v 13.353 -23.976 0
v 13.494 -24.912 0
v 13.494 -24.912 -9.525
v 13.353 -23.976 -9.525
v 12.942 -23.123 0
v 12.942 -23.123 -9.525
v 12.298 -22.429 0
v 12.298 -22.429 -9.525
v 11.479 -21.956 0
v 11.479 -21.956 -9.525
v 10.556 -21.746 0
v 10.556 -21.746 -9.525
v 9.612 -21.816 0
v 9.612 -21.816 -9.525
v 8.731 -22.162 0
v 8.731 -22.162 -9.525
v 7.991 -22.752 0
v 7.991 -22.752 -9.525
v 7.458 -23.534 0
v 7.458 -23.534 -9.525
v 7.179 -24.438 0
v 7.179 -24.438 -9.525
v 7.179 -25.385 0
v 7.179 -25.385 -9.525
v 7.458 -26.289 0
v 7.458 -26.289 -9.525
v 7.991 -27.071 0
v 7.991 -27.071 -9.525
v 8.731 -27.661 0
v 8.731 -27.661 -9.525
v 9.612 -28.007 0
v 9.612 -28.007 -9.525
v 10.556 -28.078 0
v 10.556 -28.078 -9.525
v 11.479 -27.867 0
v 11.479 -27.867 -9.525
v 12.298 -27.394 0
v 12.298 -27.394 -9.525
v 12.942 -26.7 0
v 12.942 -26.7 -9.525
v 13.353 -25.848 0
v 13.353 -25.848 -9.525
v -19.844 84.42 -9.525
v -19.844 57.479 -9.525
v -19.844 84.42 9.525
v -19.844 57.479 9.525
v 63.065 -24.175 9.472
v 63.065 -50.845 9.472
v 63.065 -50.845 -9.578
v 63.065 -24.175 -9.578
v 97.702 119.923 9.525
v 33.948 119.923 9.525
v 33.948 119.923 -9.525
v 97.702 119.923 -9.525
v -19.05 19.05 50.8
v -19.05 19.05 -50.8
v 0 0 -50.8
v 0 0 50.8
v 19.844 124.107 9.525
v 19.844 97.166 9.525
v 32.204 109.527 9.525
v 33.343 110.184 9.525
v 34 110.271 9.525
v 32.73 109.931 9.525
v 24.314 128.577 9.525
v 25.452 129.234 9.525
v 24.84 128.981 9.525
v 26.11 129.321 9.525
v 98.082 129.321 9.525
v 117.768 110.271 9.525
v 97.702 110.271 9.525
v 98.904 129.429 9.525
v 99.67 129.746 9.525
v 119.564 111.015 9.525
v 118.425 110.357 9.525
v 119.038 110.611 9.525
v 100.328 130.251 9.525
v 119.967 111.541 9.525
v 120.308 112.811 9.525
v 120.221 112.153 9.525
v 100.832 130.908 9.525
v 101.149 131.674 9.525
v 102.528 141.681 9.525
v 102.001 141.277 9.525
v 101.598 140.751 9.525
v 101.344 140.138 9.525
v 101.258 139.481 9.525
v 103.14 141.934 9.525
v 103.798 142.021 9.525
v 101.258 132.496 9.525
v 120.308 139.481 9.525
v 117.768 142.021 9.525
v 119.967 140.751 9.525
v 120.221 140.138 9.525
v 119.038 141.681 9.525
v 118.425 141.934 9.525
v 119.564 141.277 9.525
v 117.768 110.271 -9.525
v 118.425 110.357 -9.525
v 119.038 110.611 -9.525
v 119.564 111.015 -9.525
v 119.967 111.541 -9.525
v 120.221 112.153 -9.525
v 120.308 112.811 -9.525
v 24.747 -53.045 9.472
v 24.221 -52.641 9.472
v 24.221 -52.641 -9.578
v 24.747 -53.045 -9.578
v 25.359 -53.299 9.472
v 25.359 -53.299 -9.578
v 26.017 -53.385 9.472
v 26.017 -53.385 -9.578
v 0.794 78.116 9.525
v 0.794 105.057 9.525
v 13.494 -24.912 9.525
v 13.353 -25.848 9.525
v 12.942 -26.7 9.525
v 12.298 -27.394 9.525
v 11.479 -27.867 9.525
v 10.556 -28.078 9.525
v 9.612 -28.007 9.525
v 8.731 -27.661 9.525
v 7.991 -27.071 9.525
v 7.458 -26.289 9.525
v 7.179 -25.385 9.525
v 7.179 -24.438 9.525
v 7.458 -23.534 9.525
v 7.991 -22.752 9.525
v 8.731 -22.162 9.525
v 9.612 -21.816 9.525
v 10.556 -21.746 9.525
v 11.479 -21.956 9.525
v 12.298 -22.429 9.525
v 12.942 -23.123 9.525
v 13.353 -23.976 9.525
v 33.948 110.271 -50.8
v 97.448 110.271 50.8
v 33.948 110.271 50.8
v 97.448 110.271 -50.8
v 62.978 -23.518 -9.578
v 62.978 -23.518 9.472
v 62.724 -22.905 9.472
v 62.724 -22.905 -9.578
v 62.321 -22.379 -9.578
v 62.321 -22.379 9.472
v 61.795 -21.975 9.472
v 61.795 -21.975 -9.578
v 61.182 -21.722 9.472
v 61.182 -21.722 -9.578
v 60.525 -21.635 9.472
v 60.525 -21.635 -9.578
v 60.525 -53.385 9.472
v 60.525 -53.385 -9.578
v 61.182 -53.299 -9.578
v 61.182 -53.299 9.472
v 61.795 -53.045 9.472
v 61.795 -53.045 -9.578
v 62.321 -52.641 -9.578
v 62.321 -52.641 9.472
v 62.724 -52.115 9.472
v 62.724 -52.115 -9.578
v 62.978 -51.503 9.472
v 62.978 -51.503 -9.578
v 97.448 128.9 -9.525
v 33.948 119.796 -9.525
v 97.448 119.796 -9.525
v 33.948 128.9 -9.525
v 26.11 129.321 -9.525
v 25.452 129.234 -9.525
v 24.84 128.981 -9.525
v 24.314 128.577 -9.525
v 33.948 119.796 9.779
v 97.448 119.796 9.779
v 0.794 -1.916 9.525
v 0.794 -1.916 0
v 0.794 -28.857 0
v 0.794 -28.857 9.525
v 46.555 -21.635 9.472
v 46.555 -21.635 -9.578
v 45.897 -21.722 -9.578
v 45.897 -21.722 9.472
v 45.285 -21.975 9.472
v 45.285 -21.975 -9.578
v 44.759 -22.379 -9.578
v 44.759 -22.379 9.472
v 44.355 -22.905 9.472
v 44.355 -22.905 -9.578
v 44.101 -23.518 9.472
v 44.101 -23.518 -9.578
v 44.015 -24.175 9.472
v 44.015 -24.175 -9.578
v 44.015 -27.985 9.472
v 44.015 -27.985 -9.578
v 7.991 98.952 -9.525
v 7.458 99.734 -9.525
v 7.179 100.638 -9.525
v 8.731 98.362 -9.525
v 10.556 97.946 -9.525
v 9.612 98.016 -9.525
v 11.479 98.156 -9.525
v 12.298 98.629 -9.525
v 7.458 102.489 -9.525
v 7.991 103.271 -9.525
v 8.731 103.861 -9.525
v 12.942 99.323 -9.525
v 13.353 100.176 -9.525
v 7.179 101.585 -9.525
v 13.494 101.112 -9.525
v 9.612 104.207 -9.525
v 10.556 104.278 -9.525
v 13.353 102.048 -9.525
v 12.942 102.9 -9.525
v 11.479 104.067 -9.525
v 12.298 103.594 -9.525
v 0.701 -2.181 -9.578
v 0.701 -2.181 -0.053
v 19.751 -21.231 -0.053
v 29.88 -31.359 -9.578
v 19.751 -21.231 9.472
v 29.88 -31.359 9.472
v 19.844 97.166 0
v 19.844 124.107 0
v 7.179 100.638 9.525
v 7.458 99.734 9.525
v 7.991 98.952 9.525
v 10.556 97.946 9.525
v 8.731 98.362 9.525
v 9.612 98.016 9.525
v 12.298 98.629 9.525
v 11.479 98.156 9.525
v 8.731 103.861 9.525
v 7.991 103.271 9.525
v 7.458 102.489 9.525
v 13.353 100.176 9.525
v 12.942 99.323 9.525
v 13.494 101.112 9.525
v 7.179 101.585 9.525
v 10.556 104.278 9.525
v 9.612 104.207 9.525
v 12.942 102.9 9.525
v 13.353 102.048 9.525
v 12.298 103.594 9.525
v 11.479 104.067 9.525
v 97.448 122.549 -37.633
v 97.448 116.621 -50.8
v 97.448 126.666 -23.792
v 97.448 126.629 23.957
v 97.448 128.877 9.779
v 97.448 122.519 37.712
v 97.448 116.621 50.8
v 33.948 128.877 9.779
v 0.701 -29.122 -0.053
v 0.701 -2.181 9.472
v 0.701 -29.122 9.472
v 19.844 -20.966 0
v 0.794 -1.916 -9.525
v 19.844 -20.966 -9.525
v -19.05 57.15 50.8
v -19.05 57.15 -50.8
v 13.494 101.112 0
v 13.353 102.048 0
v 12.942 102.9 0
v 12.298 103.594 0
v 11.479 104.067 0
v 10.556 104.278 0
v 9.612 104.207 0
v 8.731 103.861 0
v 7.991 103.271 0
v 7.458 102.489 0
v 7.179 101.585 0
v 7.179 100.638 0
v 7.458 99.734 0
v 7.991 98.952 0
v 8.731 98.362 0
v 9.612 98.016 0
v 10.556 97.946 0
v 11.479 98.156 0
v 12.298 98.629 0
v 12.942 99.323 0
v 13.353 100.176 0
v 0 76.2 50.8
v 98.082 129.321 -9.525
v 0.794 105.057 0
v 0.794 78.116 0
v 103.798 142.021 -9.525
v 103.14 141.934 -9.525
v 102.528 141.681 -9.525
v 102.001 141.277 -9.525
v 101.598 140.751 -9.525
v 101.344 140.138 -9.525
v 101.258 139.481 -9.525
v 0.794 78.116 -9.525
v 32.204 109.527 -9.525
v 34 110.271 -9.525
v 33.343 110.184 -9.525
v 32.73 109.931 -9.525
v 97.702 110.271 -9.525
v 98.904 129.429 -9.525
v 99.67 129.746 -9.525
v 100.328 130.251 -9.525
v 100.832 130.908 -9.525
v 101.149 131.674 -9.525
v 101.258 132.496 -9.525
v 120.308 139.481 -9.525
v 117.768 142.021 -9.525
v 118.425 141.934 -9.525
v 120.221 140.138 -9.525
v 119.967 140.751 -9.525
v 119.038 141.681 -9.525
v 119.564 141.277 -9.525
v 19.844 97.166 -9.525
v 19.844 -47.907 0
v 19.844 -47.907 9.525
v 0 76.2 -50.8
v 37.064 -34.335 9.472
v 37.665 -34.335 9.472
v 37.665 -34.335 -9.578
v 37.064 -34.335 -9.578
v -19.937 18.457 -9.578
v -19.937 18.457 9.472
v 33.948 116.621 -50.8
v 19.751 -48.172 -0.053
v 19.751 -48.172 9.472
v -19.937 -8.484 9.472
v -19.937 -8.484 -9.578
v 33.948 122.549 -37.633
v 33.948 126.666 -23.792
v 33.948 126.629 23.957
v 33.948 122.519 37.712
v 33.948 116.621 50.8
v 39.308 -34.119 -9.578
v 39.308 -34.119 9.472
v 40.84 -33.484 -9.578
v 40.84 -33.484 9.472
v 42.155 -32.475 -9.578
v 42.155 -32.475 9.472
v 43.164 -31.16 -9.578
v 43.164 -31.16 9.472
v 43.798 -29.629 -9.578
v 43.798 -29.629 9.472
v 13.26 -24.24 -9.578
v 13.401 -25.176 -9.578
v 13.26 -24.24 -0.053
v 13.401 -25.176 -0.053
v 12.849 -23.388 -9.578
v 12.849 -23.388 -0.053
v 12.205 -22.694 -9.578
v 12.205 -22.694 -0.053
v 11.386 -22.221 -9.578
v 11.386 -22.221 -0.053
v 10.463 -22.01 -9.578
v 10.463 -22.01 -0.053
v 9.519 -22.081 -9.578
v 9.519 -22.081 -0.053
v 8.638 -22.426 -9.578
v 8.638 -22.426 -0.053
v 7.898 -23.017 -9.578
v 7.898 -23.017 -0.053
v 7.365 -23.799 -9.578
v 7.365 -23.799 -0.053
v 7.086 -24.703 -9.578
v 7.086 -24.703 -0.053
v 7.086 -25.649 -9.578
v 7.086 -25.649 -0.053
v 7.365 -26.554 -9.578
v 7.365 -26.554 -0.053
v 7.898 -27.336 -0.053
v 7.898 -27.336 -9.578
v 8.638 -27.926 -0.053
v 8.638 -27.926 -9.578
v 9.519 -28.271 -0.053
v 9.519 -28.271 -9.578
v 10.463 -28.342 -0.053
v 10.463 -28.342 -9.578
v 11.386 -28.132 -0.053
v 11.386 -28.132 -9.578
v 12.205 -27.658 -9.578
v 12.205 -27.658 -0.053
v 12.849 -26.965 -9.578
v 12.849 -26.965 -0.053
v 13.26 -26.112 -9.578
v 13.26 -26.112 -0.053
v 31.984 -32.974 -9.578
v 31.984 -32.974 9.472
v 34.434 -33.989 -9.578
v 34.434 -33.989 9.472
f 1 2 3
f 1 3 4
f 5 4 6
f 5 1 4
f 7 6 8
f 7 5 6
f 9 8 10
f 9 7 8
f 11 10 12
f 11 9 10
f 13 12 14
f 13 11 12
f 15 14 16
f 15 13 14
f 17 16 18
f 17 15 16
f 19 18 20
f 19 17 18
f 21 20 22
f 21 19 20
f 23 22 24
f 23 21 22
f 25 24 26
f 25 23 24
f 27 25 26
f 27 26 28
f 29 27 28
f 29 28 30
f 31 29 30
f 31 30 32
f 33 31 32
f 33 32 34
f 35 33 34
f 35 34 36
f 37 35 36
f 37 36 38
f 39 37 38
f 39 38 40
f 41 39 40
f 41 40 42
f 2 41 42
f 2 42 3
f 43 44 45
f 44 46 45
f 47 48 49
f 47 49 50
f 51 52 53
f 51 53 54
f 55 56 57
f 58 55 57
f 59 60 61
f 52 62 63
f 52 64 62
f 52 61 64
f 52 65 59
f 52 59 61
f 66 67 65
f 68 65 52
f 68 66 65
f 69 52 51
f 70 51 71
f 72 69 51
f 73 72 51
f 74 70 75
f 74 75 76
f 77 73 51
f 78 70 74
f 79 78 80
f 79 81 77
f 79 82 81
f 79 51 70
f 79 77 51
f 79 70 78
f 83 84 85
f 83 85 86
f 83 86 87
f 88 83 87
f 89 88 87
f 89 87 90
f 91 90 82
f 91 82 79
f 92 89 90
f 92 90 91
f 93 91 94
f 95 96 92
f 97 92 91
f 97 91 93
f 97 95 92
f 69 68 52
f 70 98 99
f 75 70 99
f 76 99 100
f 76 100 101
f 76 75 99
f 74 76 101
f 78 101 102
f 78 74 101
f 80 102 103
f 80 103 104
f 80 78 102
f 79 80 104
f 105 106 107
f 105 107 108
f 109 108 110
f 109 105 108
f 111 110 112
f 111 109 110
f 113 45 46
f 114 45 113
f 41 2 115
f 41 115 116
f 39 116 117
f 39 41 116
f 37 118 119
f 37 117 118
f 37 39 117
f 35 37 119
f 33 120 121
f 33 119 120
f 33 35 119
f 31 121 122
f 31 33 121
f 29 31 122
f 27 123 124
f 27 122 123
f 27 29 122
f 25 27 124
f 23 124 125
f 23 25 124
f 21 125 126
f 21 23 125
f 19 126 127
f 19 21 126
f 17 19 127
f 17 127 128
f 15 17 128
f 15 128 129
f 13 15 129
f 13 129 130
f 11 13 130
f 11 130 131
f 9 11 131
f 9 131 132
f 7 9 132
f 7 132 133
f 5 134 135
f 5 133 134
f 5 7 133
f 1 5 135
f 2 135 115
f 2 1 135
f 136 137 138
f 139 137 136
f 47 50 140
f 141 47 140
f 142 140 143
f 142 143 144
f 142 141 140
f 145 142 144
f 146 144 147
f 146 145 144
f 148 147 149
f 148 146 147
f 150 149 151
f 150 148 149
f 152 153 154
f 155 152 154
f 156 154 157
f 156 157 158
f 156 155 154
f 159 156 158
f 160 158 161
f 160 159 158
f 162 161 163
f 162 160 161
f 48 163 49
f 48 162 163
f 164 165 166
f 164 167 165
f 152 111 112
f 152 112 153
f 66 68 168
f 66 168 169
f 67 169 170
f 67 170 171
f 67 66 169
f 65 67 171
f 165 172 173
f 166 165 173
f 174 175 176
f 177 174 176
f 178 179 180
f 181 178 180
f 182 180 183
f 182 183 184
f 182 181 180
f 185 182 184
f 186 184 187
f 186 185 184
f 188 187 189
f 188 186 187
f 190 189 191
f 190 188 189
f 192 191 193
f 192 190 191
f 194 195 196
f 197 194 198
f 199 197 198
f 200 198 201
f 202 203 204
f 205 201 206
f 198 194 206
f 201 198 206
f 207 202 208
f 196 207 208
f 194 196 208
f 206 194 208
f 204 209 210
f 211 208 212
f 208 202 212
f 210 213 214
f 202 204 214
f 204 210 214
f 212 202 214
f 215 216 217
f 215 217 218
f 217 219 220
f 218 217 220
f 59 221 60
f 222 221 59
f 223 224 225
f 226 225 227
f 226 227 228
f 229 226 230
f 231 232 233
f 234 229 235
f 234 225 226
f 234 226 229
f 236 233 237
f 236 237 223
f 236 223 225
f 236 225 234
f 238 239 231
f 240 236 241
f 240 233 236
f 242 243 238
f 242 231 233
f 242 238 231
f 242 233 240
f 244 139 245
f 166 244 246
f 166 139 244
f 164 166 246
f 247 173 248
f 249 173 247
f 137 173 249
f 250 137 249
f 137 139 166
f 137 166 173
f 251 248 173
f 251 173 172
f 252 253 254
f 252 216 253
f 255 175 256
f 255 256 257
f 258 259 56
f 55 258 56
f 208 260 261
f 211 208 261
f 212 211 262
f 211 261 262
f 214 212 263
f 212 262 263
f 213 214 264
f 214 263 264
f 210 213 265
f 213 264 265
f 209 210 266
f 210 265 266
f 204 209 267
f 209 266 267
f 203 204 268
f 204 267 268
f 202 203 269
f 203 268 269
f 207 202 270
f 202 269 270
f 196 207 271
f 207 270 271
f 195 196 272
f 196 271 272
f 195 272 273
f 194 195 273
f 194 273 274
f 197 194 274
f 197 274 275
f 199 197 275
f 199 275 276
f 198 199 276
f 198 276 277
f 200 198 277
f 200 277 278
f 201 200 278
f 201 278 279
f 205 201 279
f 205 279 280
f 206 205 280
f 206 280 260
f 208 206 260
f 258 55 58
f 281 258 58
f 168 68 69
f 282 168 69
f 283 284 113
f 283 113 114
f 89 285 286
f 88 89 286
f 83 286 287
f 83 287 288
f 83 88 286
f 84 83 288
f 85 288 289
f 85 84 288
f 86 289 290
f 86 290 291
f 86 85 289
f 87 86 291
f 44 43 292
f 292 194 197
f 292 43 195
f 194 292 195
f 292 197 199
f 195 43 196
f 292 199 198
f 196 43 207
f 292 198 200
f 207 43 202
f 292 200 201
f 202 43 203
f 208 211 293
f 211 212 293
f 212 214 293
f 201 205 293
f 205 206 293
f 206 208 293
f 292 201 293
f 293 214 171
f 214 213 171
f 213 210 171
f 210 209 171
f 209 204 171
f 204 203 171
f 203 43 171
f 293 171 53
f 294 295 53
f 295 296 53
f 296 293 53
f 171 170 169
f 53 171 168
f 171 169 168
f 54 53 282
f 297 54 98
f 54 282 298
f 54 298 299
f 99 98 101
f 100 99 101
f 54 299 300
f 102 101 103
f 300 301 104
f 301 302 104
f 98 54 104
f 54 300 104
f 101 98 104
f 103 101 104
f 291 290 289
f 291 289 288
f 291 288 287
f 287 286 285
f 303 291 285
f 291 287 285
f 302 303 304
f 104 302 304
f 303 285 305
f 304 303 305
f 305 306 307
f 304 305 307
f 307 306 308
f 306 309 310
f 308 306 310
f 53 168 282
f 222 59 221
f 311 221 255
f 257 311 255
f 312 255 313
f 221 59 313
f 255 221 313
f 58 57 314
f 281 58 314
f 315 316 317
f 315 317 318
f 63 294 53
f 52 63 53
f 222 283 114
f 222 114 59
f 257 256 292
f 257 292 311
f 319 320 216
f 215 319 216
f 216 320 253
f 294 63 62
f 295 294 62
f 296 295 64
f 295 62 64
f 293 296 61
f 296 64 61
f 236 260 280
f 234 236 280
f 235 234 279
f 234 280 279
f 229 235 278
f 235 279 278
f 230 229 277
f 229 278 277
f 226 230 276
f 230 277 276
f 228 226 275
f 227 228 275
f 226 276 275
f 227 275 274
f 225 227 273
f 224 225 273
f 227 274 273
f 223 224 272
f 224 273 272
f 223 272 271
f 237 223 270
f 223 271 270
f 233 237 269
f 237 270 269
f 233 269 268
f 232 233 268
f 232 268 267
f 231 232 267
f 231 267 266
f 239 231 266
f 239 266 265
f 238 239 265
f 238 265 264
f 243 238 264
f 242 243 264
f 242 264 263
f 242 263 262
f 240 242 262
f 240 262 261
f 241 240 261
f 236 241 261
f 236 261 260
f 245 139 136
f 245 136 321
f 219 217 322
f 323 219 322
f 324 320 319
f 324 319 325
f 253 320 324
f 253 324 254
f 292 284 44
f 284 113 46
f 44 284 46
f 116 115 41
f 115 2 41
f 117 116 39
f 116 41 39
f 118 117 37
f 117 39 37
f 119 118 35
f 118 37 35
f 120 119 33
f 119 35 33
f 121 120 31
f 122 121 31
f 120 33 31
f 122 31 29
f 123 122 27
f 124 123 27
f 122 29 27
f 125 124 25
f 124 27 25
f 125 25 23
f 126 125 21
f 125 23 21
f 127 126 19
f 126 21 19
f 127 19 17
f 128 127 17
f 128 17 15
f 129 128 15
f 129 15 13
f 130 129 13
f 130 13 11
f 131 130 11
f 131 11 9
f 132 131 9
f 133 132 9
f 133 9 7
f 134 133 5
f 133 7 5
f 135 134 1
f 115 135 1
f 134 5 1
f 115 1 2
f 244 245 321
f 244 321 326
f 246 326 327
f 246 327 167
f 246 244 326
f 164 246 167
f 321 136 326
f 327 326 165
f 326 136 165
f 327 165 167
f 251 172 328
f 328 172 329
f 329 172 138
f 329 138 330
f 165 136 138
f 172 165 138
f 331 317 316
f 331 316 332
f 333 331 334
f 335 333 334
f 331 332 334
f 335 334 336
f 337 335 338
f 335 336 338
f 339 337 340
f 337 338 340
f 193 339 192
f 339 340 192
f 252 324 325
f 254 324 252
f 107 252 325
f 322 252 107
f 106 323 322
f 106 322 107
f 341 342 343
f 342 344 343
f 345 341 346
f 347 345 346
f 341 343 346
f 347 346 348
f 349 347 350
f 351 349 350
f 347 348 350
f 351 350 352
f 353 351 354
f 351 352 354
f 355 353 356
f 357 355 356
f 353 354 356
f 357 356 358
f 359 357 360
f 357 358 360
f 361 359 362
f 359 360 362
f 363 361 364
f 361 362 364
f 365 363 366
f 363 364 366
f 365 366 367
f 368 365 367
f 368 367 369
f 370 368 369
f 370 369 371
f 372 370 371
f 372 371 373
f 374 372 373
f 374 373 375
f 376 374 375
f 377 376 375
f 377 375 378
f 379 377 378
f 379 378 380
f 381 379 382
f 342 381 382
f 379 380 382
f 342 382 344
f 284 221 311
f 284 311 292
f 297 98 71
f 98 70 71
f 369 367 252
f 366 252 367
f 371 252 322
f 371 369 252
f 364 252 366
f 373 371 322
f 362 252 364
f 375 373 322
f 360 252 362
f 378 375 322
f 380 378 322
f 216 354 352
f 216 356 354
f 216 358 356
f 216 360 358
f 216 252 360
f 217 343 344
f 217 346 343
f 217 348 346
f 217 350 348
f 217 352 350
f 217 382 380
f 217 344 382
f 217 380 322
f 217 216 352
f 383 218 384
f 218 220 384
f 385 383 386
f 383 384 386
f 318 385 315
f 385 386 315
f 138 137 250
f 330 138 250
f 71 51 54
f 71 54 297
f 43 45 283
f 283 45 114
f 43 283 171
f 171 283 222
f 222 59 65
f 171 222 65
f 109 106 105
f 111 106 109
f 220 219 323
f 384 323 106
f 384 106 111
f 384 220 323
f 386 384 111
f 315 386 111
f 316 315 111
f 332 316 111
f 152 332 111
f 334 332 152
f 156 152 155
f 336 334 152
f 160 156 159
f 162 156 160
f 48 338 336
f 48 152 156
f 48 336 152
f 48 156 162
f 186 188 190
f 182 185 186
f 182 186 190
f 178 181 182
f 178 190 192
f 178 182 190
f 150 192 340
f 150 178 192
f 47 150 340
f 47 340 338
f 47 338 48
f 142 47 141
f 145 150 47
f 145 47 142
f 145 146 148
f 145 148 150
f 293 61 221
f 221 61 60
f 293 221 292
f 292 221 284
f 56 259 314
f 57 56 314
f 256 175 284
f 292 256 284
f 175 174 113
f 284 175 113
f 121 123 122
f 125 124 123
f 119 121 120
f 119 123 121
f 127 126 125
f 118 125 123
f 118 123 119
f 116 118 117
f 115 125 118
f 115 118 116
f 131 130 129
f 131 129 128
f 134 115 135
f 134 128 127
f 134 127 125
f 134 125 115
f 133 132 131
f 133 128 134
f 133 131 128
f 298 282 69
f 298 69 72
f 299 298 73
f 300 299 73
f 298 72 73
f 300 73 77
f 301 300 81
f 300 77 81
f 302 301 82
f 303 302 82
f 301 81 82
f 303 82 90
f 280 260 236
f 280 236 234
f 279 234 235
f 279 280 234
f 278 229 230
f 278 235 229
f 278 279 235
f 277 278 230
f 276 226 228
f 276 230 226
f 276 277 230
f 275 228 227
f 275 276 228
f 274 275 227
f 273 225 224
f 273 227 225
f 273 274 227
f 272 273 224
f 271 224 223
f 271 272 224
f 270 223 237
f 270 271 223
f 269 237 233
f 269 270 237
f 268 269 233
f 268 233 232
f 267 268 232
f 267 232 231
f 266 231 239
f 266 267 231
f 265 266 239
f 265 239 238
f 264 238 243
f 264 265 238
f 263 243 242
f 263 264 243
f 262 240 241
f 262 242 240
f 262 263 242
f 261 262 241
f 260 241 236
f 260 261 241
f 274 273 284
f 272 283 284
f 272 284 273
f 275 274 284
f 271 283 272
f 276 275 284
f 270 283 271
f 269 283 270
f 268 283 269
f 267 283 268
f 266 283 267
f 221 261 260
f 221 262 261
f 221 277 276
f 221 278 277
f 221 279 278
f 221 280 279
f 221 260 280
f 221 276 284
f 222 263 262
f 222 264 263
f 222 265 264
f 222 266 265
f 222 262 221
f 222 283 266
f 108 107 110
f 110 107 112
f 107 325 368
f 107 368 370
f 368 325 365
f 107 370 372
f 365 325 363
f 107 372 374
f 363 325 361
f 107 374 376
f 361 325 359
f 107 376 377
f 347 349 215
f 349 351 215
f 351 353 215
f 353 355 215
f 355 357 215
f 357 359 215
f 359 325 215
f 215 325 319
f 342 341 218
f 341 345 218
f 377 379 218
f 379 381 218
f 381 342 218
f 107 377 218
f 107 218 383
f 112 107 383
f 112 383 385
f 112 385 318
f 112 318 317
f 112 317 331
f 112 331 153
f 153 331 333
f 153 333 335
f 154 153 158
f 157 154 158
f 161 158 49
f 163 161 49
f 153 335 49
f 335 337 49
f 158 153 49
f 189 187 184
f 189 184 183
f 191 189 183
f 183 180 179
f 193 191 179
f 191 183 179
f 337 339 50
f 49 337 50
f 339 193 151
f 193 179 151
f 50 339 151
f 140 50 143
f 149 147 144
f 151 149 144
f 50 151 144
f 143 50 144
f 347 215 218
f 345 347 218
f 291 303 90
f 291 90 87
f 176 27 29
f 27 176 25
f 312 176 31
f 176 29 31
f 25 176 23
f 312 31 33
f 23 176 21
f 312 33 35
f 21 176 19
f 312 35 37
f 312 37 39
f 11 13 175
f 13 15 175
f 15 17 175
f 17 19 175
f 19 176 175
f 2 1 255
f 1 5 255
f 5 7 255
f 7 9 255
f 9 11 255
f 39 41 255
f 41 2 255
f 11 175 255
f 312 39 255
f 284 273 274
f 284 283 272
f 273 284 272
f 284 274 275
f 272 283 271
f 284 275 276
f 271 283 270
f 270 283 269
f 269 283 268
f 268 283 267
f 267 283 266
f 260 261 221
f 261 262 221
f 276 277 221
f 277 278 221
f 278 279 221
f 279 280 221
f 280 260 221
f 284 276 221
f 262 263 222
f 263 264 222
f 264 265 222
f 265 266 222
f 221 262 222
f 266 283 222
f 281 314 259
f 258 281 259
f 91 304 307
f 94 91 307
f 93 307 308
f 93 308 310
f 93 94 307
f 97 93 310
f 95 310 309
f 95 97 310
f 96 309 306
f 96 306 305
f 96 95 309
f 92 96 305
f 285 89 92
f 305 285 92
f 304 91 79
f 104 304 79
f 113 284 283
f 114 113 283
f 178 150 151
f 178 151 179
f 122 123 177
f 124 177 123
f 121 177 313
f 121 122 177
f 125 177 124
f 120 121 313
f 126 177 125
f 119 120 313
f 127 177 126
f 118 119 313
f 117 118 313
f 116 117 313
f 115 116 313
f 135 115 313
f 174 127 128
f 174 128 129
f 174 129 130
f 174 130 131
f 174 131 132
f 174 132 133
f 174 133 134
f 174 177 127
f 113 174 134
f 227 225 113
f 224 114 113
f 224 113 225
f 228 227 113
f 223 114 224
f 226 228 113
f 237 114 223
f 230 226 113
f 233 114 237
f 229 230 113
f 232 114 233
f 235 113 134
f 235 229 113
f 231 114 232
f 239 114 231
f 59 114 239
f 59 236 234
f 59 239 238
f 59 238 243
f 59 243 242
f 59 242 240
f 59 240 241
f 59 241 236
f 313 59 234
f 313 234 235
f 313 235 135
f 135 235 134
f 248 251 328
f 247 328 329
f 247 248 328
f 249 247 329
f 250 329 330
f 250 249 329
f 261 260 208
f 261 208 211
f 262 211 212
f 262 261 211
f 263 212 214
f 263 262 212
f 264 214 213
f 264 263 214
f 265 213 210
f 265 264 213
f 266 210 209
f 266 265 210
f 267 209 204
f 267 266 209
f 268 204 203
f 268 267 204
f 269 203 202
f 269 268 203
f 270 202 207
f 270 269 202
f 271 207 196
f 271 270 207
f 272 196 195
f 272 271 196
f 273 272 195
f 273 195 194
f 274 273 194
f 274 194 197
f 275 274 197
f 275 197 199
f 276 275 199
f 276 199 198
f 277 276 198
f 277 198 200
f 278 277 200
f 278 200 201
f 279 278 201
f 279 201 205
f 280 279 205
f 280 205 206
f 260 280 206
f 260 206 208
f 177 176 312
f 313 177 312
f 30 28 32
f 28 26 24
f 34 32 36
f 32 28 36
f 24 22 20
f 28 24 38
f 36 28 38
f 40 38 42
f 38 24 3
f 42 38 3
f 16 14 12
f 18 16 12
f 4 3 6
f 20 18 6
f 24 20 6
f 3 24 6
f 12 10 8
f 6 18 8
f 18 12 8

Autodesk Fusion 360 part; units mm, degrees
sketch "Sketch1" plane through (0, 0, 0) normal (0, 0, 1) x (1, 0, 0)
  line L0 (0, 0) -> (0, 76.2)
  line L1 (0, 76.2) -> (-19.05, 57.15)
  line L2 (-19.05, 57.15) -> (-19.05, 19.05)
  line L3 (-19.05, 19.05) -> (0, 0)
  line L4 (0.7937, -1.9163) -> (0.7938, 78.1163)
  line L5 (0.7938, 78.1163) -> (-19.8438, 57.4788)
  line L6 (-19.8438, 57.4788) -> (-19.8438, 18.7212)
  line L7 (-19.8438, 18.7212) -> (0.7937, -1.9163)
  line L8 (-19.8438, 57.4788) -> (-19.8438, 84.4196)
  line L9 (-19.8438, 84.4196) -> (24.3136, 128.5769)
  line L10 (32.2044, 109.5269) -> (0.7938, 78.1163)
  line L11 (19.8438, 97.1663) -> (19.8438, -47.9071)
  line L12 (19.8438, 97.1663) -> (19.8438, 124.1071)
  line L13 (0.7938, 78.1163) -> (0.7937, 105.0571)
  line L14 (0.7937, -1.9163) -> (29.9725, -31.095)
  line L15 (-19.8438, 18.7212) -> (-19.8438, -8.2196)
  line L16 (-19.8438, -8.2196) -> (24.3136, -52.3769)
  line L17 (0.7937, -1.9163) -> (0.7937, -28.8571)
  line L18 (26.1096, -53.1208) -> (60.6175, -53.1208)
  line L19 (63.1575, -50.5808) -> (63.1575, -23.9108)
  line L20 (60.6175, -21.3708) -> (46.6475, -21.3708)
  line L21 (44.1075, -23.9108) -> (44.1075, -27.7208)
  line L22 (37.7575, -34.0708) -> (37.1567, -34.0708)
  arc A0 (37.7575, -34.0708) -> (44.1075, -27.7208) centre (37.7575, -27.7208) ccw
  arc A1 (29.9725, -31.095) -> (37.1567, -34.0708) centre (37.1567, -23.9108) ccw
  arc A2 (46.6475, -21.3708) -> (44.1075, -23.9108) centre (46.6475, -23.9108) ccw
  arc A3 (63.1575, -23.9108) -> (60.6175, -21.3708) centre (60.6175, -23.9108) ccw
  arc A4 (60.6175, -53.1208) -> (63.1575, -50.5808) centre (60.6175, -50.5808) ccw
  arc A5 (24.3136, -52.3769) -> (26.1096, -53.1208) centre (26.1096, -50.5808) ccw
  line L23 (26.1096, 129.3208) -> (98.0825, 129.3208)
  line L24 (101.2575, 132.4958) -> (101.2575, 139.4808)
  line L25 (103.7975, 142.0208) -> (117.7675, 142.0208)
  line L26 (120.3075, 139.4808) -> (120.3075, 112.8108)
  line L27 (117.7675, 110.2708) -> (34.0004, 110.2708)
  arc A6 (34.0004, 110.2708) -> (32.2044, 109.5269) centre (34.0004, 107.7308) ccw
  arc A7 (26.1096, 129.3208) -> (24.3136, 128.5769) centre (26.1096, 126.7808) ccw
  arc A8 (98.0825, 129.3208) -> (101.2575, 132.4958) centre (98.0825, 132.4958) ccw
  arc A9 (103.7975, 142.0208) -> (101.2575, 139.4808) centre (103.7975, 139.4808) ccw
  arc A10 (120.3075, 139.4808) -> (117.7675, 142.0208) centre (117.7675, 139.4808) ccw
  arc A11 (117.7675, 110.2708) -> (120.3075, 112.8108) centre (117.7675, 112.8108) ccw
  line L28 (0.7937, 105.0571) -> (19.8438, 97.1663) construction
  line L29 (19.8438, 124.1071) -> (0.7938, 78.1163) construction
  circle A12 centre (10.3188, 101.1117) radius 3.175
  line L30 (0.7937, -1.9163) -> (19.8438, -47.9071) construction
  line L31 (19.8438, -20.9663) -> (0.7937, -28.8571) construction
  circle A13 centre (10.3187, -24.9117) radius 3.175
  dimension "d1" = 76.2
  dimension "d2" = 45
  dimension "d3" = 45
  dimension "d4" = 19.05
  dimension "d5" = 0.7937
  dimension "d6" = 19.05
  dimension "d8" = 19.05
  dimension "d9" = 19.05
  dimension "d10" = 63.5
  dimension "d11" = 38.1
  dimension "d12" = 31.75
  dimension "d13" = 19.05
  dimension "d14" = 19.05
  dimension "d15" = 6.35
  dimension "d16" = 10.16
  dimension "d17" = 2.54
  dimension "d18" = 2.54
  dimension "d19" = 2.54
  dimension "d20" = 2.54
  dimension "d23" = 19.05
  dimension "d24" = 19.05
  dimension "d25" = 12.7
  dimension "d26" = 76.2
  dimension "d27" = 2.54
  dimension "d28" = 2.54
  dimension "d29" = 3.175
  dimension "d30" = 2.54
  dimension "d31" = 2.54
  dimension "d46" = 6.35
  dimension "d47" = 6.35
extrude "Extrude1" add sketch "Sketch1" against normal blind 9.525 contours L9 L10 L12 L13 | L5 L8 L9 L13 | L9 L10 L12 L23 L24 L25 L26 L27 A6 A7 A8 A9 A10 A11 | A12 makes body 1 in component "Component"
extrude "Extrude2" add sketch "Sketch1" along normal blind 9.525 contours L5 L8 L9 L13 | L9 L10 L12 L23 L24 L25 L26 L27 A6 A7 A8 A9 A10 A11 bodies 1 in component "Component"
extrude "Extrude1'" add sketch "Sketch1" along normal blind 9.525 separate body contours L4 L10 L11 L14 | L11 L14 L16 L17 | L9 L10 L12 L13 | A12 | A13 makes body 2 in component "Component'"
extrude "Extrude2'" add sketch "Sketch1" against normal blind 9.525 contours L4 L10 L11 L14 bodies 2 in component "Component'"
extrude "Extrude1''" add sketch "Sketch1" against normal blind 9.525 separate body contours L7 L15 L16 L17 | L11 L14 L16 L17 | L11 L14 L16 L18 L19 L20 L21 L22 A0 A1 A2 A3 A4 A5 | A13 makes body 3 in component "Component''"
extrude "Extrude2''" add sketch "Sketch1" along normal blind 9.525 contours L7 L15 L16 L17 | L11 L14 L16 L18 L19 L20 L21 L22 A0 A1 A2 A3 A4 A5 bodies 3 in component "Component''"
extrude "Extrude1'''" add sketch "Sketch1" along normal mid plane 101.6 separate body contours L0 L1 L2 L3 makes body 4 in component "Component'''"
extrude "Extrude3" cut sketch "Sketch1" against normal through all contours A12 bodies 1 in component "Component"
extrude "Extrude3'" cut sketch "Sketch1" along normal through all contours A12 bodies 2 in component "Component'"
extrude "Extrude4" cut sketch "Sketch1" along normal through all contours A13 bodies 2 in component "Component'"
extrude "Extrude3''" cut sketch "Sketch1" against normal through all contours A13 bodies 3 in component "Component''"
extrude "Extrude1''''" add sketch "Sketch1" along normal mid plane 19.05 separate body contours A12 makes body 5 in component "Component''''"
extrude "Extrude1'''''" add sketch "Sketch1" along normal blind 9.525 and the other way blind 0 separate body contours A13 makes body 6 in component "Component'''''"
extrude "Extrude2'''" add sketch "Sketch1" against normal blind 9.525 contours A13 bodies 6 in component "Component'''''"
ref_plane "WorkPlane1" through (101.2575, 126.1458, 0) normal (1, 0, 0) x (0, -1, 0)
sketch "Sketch2" plane through (101.2575, 126.1458, 0) normal (1, 0, 0) x (0, 1, 0)
  line L0 (-16.6189, -9.525) -> (-16.6189, 9.525)
  line L1 (-15.875, 0) -> (-15.875, 50.8)
  line L2 (-15.875, 50.8) -> (-9.525, 50.8)
  line L3 (-15.875, 0) -> (-15.875, -50.8)
  line L4 (-15.875, -50.8) -> (-9.525, -50.8)
  line L5 (-15.875, 0) -> (3.175, 0)
  arc A0 (-9.525, -50.8) -> (-9.525, 50.8) centre (-104.775, 0) ccw
  dimension "d61" = 50.8
  dimension "d62" = 6.35
  dimension "d63" = 90
  dimension "d64" = 50.8
  dimension "d65" = 6.35
  dimension "d66" = 19.05
extrude "Extrude1''''''" add sketch "Sketch2" against normal blind 73.66 separate body makes body 7 in component "Component''''''"
ref_plane "WorkPlane2" through (64.4275, 129.3208, 0) normal (0, -1, 0) x (0, 0, 1)
ref_plane "WorkPlane1" through (64.4275, 129.3208, 0) normal (0, -1, 0) x (0, 0, 1) in component "Component''''''"
sketch "Sketch1 (2)" plane through (63.1575, 129.3208, 0) normal (0, -1, 0) x (1, 0, 0) in component "Component''''''"
  line L0 (38.1, 9.779) -> (-38.0387, 9.779)
  line L1 (-30.9532, -9.525) -> (-83.0013, -9.525)
  line L2 (38.1, -50.8) -> (38.1, 50.8)
  line L3 (-38.0387, -9.525) -> (38.1, -9.525)
  line L4 (38.1, 9.525) -> (38.1, -9.525)
  line L5 (-38.0387, -9.525) -> (-38.0387, 9.779)
  line L6 (-38.0387, 0.127) -> (38.1, 0)
  dimension "d79" = 19.304
extrude "Extrude2''''" cut sketch "Sketch1 (2)" along normal blind 9.525 bodies 7 in component "Component''''''"
move_face "OffsetFaces1" offset -3.81 1 faces at (101.2575, 113.4458, -3.175) on bodies 7 in component "Component''''''"
extrude "Extrude3'''" cut 1 faces at (27.5975, 113.4458, -3.175) along direction (1, 0, 0) blind 6.35 on bodies 7 bodies 7 in component "Component''''''"
sketch "Sketch1 (3)" plane through (0, 0, 9.525) normal (0, 0, 1) x (-1, 0, 0) in component "Component"
  line L0 (-34.0004, -110.2708) -> (-117.7675, -110.2708)
  arc A0 (-117.7675, -110.2708) -> (-120.3075, -112.8108) centre (-117.7675, -112.8108) ccw
  line L1 (-120.3075, -112.8108) -> (-120.3075, -139.4808)
  arc A1 (-120.3075, -139.4808) -> (-117.7675, -142.0208) centre (-117.7675, -139.4808) ccw
  line L2 (-117.7675, -142.0208) -> (-103.7975, -142.0208)
  arc A2 (-103.7975, -142.0208) -> (-101.2575, -139.4808) centre (-103.7975, -139.4808) ccw
  line L3 (-101.2575, -139.4808) -> (-101.2575, -132.4958)
  arc A3 (-98.0825, -129.3208) -> (-101.2575, -132.4958) centre (-98.0825, -132.4958) ccw
  line L4 (-98.0825, -129.3208) -> (-26.1096, -129.3208)
  arc A4 (-26.1096, -129.3208) -> (-24.3136, -128.5769) centre (-26.1096, -126.7808) ccw
  line L5 (-24.3136, -128.5769) -> (-19.8438, -124.1071)
  line L6 (-19.8438, -124.1071) -> (-19.8438, -97.1663)
  line L7 (-19.8438, -97.1663) -> (-32.2044, -109.5269)
  arc A5 (-34.0004, -110.2708) -> (-32.2044, -109.5269) centre (-34.0004, -107.7308) ccw
  line L8 (-34.0004, -110.2708) -> (-33.9475, -119.9228)
  line L9 (-33.9475, -119.9228) -> (-97.7015, -119.9228)
  line L10 (-97.7015, -119.9228) -> (-97.7015, -110.2708)
  dimension "d77" = 63.754
  dimension "d78" = 9.652
extrude "Extrude4'" cut sketch "Sketch1 (3)" against normal through all contours L0 L8 L9 L10 bodies 1 in component "Component"
component "Component" placed x (1, 0, 0) y (0, 1, 0) z (0, 0, 1) at (0, 0, 0)
component "Component'" placed x (1, 0, 0) y (0, 1, 0) z (0, 0, 1) at (0, 0, 0)
component "Component''" placed x (1, 0, 0) y (0, 1, 0) z (0, 0, 1) at (-0.0928, -0.2644, -0.0528)
component "Component'''" placed x (1, 0, 0) y (0, 1, 0) z (0, 0, 1) at (0, 0, 0)
component "Component''''" placed x (1, 0, 0) y (0, 1, 0) z (0, 0, 1) at (0, 0, 0)
component "Component'''''" placed x (1, 0, 0) y (0, 1, 0) z (0, 0, 1) at (0, 0, 0)
component "Component''''''" placed x (1, 0, 0) y (0, 1, 0) z (0, 0, 1) at (0, 0, 0)
